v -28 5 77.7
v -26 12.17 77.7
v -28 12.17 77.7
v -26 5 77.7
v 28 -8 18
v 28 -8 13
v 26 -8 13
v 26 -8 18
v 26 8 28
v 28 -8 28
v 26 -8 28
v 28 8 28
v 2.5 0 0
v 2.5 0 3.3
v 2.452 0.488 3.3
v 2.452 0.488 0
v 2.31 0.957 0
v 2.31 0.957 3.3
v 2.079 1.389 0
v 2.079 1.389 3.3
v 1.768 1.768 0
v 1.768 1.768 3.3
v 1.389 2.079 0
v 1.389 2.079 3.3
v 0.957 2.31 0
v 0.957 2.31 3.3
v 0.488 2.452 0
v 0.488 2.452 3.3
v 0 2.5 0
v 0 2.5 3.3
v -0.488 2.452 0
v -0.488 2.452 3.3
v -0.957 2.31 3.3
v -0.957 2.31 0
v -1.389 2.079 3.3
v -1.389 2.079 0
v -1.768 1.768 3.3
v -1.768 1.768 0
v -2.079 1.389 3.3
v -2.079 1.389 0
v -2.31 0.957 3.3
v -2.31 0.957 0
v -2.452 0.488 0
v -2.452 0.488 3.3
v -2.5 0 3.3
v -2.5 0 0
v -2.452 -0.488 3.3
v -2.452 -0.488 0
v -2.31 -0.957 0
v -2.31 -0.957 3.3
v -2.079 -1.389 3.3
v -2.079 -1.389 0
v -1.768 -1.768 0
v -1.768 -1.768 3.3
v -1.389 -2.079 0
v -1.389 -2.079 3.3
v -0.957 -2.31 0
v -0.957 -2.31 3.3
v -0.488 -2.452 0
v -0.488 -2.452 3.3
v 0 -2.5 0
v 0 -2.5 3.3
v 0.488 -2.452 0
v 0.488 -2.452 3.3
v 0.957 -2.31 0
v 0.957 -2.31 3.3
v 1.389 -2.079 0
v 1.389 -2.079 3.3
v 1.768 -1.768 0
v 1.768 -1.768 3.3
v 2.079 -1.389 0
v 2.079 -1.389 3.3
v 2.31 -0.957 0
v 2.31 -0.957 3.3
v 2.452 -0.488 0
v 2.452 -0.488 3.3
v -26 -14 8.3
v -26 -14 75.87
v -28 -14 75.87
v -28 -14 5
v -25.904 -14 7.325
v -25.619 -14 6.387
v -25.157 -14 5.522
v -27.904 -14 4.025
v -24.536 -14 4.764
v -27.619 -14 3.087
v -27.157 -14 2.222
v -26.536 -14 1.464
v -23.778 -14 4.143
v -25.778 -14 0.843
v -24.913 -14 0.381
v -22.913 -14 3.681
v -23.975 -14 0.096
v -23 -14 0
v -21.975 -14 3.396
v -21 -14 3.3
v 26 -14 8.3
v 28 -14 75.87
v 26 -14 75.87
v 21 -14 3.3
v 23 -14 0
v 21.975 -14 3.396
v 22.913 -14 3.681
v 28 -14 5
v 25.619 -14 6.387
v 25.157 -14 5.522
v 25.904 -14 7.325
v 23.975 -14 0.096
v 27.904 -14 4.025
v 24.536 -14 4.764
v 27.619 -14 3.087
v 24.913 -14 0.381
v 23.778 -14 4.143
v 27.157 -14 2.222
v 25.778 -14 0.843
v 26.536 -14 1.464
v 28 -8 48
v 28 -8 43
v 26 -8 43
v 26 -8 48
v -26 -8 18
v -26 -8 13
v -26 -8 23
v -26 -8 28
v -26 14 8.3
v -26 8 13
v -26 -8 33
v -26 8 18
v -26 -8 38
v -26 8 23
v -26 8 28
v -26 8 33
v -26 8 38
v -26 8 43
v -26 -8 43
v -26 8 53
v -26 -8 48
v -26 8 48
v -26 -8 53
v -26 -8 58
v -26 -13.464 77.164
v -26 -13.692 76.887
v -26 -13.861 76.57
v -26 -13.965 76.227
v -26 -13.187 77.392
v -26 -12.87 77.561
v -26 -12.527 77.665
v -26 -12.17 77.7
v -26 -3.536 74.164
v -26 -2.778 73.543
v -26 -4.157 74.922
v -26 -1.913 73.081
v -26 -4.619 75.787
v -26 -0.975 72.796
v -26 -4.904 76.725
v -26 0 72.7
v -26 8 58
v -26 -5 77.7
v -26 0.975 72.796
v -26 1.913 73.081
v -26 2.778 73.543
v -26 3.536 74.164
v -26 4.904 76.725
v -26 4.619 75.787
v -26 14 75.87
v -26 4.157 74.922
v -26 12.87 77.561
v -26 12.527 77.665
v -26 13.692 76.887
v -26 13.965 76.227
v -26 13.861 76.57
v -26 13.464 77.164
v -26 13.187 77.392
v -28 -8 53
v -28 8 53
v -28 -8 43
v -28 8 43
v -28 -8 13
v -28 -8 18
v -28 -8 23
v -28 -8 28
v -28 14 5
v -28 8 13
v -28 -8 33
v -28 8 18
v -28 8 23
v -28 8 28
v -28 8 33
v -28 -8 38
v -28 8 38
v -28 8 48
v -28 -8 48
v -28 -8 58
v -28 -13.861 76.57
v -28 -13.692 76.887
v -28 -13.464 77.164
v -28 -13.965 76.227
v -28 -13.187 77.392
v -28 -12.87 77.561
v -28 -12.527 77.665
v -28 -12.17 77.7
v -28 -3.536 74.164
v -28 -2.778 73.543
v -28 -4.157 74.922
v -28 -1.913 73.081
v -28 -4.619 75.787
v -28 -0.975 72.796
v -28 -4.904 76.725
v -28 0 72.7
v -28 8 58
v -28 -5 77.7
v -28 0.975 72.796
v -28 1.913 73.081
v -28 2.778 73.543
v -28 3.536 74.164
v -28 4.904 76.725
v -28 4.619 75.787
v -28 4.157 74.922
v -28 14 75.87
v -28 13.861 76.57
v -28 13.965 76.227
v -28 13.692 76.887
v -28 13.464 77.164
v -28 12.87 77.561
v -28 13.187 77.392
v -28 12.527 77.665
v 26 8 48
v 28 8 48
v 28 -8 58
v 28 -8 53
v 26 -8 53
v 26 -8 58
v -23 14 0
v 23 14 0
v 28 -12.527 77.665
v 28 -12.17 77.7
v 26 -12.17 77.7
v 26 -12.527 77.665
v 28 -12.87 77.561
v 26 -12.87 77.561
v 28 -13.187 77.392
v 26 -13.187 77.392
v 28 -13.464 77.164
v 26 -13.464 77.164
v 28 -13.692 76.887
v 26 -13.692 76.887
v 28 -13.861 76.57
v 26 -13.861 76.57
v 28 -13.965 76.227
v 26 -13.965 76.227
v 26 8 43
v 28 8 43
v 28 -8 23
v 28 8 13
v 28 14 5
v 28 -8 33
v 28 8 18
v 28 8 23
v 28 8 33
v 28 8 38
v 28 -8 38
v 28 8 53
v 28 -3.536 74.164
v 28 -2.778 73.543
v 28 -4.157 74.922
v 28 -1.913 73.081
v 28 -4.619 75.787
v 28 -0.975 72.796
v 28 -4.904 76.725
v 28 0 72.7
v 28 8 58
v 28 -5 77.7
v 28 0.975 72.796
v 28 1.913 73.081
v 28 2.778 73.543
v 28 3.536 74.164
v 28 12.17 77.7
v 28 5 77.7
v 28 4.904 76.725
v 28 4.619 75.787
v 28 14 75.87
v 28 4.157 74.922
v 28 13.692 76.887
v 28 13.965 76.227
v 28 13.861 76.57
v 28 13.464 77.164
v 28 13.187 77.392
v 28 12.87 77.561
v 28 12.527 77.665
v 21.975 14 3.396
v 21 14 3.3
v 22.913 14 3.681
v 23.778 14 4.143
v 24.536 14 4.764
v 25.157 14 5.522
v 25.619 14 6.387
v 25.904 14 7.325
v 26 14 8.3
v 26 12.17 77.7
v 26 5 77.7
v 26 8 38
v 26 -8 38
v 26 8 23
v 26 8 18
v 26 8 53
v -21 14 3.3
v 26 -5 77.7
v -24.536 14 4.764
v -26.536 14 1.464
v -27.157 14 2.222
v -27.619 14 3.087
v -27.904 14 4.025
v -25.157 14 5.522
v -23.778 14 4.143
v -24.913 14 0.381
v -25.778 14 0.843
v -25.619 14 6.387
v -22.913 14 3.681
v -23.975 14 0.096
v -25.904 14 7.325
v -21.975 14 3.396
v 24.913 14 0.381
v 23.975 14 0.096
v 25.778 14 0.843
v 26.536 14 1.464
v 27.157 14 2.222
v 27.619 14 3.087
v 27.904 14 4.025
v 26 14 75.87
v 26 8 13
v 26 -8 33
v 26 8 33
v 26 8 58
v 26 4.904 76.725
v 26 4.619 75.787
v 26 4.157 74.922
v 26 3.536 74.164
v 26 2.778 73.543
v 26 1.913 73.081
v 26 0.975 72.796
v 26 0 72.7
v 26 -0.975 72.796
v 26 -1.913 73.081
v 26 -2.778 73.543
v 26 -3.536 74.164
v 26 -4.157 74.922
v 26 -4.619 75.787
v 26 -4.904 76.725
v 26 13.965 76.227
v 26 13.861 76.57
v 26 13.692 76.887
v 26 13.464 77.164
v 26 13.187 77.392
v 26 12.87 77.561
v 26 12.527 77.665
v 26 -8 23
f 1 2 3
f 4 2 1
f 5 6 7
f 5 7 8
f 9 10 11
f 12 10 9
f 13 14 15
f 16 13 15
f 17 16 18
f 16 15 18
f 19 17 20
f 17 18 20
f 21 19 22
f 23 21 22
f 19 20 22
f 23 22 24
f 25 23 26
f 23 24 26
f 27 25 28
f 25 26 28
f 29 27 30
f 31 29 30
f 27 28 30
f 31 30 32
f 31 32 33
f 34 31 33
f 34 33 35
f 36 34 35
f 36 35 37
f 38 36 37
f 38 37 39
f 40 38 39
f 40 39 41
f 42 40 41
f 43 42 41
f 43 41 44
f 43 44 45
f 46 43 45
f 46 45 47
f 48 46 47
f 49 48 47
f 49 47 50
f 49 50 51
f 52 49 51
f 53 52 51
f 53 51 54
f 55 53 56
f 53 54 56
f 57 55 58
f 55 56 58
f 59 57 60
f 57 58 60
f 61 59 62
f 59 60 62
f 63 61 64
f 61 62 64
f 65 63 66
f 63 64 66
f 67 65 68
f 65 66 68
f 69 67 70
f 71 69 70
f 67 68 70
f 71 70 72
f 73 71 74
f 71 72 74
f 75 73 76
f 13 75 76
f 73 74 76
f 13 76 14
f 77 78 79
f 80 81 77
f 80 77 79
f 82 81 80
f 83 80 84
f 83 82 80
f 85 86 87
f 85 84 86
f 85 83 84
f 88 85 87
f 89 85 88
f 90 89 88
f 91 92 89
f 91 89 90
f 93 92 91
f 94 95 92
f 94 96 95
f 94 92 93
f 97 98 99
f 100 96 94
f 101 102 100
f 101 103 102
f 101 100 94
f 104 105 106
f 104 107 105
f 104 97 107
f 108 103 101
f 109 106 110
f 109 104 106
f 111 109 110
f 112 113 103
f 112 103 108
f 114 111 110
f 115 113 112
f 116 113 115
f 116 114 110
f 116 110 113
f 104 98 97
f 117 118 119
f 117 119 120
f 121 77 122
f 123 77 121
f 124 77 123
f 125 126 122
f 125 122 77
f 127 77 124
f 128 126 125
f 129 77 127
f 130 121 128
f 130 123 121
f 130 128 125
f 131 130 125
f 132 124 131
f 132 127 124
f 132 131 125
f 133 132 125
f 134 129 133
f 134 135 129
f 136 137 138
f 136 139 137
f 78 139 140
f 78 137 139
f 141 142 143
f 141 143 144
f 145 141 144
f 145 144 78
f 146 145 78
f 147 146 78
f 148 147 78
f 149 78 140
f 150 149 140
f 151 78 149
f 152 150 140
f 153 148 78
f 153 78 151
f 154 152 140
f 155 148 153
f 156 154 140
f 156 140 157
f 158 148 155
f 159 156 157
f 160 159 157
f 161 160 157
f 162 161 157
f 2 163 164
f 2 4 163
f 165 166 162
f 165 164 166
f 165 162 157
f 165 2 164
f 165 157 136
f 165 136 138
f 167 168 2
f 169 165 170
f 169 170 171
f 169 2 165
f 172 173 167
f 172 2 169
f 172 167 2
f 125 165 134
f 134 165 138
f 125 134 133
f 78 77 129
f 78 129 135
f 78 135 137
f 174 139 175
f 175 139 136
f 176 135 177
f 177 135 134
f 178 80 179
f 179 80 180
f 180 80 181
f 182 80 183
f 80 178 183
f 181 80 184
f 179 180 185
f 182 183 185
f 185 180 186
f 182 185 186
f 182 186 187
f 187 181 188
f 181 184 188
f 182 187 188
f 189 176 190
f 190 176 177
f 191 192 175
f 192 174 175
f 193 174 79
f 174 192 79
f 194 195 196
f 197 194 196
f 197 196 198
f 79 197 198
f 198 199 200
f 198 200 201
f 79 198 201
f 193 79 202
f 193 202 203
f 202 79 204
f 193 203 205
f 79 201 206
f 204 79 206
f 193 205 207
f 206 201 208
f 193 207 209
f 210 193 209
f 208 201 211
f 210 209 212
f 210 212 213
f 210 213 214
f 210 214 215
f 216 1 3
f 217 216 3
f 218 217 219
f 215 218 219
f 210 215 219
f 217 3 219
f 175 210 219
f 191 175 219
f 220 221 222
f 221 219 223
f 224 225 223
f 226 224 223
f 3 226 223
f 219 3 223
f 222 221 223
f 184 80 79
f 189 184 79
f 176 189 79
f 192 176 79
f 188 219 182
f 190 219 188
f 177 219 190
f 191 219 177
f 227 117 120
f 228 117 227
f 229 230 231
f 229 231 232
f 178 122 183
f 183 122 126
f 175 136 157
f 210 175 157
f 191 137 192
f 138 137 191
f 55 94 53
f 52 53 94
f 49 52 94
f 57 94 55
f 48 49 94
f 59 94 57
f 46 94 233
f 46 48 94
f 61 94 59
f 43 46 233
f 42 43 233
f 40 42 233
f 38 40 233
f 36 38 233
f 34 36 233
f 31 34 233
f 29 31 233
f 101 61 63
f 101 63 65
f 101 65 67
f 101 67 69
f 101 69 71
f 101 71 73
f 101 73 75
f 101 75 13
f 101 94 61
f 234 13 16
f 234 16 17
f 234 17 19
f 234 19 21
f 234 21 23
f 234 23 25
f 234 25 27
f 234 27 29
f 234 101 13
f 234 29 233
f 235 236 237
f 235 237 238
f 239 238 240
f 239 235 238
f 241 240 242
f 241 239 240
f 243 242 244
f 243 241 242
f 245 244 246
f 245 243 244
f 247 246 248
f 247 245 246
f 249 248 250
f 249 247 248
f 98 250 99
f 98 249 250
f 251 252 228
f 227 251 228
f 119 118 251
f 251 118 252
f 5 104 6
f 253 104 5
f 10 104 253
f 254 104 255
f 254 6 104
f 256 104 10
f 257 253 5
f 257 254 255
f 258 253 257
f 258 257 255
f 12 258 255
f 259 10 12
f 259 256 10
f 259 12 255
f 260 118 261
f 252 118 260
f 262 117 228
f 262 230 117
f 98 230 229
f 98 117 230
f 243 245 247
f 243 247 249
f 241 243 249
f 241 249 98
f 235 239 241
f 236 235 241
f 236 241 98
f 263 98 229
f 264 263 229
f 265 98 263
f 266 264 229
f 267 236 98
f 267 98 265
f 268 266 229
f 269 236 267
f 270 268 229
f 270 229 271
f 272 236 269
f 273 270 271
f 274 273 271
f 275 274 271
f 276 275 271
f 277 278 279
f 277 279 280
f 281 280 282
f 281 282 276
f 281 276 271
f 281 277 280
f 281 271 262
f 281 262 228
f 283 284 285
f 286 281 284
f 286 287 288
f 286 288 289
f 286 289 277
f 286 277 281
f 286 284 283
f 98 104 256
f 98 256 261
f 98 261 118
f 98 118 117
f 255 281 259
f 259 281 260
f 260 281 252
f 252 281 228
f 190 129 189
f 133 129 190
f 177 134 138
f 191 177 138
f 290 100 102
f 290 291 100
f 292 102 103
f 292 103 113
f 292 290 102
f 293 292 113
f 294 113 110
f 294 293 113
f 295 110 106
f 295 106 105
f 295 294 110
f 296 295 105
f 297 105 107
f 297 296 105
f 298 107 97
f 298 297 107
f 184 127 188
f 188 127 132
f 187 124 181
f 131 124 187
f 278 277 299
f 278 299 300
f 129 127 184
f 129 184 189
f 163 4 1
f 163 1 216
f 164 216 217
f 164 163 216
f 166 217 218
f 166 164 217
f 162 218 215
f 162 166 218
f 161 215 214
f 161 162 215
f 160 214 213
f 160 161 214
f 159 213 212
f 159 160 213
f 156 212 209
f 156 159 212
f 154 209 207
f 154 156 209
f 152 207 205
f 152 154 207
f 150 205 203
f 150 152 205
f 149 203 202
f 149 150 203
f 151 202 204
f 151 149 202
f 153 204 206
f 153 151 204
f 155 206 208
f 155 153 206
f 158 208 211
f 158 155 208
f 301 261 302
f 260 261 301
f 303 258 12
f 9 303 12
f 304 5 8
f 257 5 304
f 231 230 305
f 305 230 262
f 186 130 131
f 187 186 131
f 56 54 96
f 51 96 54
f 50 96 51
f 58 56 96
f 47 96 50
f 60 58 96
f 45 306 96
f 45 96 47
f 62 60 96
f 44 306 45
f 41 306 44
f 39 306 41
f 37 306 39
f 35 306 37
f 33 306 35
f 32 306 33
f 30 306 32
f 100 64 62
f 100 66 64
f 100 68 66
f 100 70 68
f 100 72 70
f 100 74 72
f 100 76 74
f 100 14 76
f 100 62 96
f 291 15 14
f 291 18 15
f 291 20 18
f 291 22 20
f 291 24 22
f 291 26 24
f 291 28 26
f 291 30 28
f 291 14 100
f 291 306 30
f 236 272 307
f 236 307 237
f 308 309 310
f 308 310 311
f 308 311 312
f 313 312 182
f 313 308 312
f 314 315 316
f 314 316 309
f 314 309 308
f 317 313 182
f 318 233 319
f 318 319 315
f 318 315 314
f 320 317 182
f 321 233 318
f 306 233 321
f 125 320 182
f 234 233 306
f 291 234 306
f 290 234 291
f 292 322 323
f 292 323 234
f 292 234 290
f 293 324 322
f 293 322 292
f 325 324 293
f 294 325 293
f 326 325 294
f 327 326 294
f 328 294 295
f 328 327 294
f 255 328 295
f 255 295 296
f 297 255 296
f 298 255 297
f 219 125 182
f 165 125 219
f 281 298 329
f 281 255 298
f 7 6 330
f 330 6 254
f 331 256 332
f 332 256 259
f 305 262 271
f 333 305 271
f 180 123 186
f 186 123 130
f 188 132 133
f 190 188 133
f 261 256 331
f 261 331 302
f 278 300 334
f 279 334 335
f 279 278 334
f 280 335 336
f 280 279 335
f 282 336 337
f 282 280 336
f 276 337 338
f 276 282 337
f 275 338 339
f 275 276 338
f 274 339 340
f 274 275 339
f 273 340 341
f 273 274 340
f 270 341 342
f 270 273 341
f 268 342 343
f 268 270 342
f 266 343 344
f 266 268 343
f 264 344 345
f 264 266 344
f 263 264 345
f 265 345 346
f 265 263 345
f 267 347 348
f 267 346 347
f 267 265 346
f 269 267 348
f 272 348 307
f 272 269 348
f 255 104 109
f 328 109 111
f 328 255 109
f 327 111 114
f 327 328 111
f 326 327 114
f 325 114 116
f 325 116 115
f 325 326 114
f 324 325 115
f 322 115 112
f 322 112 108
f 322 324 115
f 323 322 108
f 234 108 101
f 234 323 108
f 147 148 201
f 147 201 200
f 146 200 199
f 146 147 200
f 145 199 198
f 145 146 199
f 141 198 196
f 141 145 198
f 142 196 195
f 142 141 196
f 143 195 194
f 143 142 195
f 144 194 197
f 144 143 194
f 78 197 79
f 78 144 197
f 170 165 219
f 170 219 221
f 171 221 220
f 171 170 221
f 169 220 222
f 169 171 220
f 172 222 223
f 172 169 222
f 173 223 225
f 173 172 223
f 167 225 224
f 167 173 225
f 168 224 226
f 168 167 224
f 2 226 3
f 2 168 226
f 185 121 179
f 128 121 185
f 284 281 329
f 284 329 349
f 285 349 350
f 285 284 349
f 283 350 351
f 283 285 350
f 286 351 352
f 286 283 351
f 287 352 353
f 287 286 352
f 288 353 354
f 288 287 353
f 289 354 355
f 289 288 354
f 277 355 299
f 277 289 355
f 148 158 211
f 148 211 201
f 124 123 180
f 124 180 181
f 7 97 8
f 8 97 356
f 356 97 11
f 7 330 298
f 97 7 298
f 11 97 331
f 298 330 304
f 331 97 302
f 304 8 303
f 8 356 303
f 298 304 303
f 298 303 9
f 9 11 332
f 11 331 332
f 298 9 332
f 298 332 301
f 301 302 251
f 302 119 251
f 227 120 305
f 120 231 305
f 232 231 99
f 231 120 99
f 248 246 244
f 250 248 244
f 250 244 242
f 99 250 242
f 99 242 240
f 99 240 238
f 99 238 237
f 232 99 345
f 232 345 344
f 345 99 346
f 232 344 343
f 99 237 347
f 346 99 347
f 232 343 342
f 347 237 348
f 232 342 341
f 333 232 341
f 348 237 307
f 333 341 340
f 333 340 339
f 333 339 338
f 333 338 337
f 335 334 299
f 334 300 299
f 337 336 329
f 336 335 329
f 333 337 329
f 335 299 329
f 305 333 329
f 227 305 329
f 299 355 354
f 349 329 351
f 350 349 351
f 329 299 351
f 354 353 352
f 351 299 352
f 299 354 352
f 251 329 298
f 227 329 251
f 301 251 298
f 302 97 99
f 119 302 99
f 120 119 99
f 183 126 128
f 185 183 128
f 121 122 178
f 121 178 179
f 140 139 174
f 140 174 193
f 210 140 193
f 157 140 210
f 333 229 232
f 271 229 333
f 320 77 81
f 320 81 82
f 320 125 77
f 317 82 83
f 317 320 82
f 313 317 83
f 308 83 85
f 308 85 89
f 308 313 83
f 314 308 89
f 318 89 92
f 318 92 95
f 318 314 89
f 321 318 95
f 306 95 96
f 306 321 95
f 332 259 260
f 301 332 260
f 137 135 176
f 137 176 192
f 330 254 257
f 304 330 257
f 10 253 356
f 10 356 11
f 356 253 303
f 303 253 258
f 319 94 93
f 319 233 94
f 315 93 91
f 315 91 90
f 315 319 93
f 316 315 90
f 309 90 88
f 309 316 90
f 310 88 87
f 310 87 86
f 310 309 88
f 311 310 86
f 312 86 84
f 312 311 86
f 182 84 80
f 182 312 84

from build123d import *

# Parameters (mm, degrees)
F0_W     = 16
F0_H     = 5
F1_DEPTH = 28
F2_W     = 52
F2_H     = 49.263156
F3_DEPTH = 74.4
F4_R     = 5
F5_R     = 2.5
F6_DEPTH = 3.301


with BuildPart() as f1:
    # F0 (on Right) → F1 (new body, symmetric)
    with BuildSketch(Plane.YZ):
        with BuildLine():
            Line((-14, 75.869719), (-14, 0))
            Line((-14, 0), (14, 0))
            Line((14, 0), (14, 75.869719))
            ThreePointArc((14, 75.869719), (13.463923, 77.163923), (12.169719, 77.7))
            Line((12.169719, 77.7), (5, 77.7))
            ThreePointArc((5, 77.7), (0, 72.7), (-5, 77.7))
            Line((-5, 77.7), (-12.169719, 77.7))
            ThreePointArc((-12.169719, 77.7), (-13.463923, 77.163923), (-14, 75.869719))
        make_face()
        with Locations((0, 15.5)):
            Rectangle(F0_W, F0_H, mode=Mode.SUBTRACT)
        with Locations((0, 25.5)):
            Rectangle(F0_W, F0_H, mode=Mode.SUBTRACT)
        with Locations((0, 35.5)):
            Rectangle(F0_W, F0_H, mode=Mode.SUBTRACT)
        with Locations((0, 45.5)):
            Rectangle(F0_W, F0_H, mode=Mode.SUBTRACT)
        with Locations((0, 55.5)):
            Rectangle(F0_W, F0_H, mode=Mode.SUBTRACT)
    extrude(amount=F1_DEPTH, both=True)

    # F2 (on face) → F3 (cut)
    with BuildSketch(Plane.XY.offset(77.7)):
        with Locations((0, 0.389209)):
            Rectangle(F2_W, F2_H)
    extrude(amount=-F3_DEPTH, mode=Mode.SUBTRACT)

    # F4
    f4_edges = [f1.edges().sort_by_distance(p)[0] for p in [
        (-28, 0, 0),
        (28, 0, 0),
        (-26, 0, 3.3),
        (26, 0, 3.3),
    ]]
    fillet(f4_edges, radius=F4_R)

    # F5 (on face) → F6 (cut, through all)
    with BuildSketch(Plane.XY.offset(3.3)):
        Circle(F5_R)
    extrude(amount=-F6_DEPTH, mode=Mode.SUBTRACT)


solid = f1.part
